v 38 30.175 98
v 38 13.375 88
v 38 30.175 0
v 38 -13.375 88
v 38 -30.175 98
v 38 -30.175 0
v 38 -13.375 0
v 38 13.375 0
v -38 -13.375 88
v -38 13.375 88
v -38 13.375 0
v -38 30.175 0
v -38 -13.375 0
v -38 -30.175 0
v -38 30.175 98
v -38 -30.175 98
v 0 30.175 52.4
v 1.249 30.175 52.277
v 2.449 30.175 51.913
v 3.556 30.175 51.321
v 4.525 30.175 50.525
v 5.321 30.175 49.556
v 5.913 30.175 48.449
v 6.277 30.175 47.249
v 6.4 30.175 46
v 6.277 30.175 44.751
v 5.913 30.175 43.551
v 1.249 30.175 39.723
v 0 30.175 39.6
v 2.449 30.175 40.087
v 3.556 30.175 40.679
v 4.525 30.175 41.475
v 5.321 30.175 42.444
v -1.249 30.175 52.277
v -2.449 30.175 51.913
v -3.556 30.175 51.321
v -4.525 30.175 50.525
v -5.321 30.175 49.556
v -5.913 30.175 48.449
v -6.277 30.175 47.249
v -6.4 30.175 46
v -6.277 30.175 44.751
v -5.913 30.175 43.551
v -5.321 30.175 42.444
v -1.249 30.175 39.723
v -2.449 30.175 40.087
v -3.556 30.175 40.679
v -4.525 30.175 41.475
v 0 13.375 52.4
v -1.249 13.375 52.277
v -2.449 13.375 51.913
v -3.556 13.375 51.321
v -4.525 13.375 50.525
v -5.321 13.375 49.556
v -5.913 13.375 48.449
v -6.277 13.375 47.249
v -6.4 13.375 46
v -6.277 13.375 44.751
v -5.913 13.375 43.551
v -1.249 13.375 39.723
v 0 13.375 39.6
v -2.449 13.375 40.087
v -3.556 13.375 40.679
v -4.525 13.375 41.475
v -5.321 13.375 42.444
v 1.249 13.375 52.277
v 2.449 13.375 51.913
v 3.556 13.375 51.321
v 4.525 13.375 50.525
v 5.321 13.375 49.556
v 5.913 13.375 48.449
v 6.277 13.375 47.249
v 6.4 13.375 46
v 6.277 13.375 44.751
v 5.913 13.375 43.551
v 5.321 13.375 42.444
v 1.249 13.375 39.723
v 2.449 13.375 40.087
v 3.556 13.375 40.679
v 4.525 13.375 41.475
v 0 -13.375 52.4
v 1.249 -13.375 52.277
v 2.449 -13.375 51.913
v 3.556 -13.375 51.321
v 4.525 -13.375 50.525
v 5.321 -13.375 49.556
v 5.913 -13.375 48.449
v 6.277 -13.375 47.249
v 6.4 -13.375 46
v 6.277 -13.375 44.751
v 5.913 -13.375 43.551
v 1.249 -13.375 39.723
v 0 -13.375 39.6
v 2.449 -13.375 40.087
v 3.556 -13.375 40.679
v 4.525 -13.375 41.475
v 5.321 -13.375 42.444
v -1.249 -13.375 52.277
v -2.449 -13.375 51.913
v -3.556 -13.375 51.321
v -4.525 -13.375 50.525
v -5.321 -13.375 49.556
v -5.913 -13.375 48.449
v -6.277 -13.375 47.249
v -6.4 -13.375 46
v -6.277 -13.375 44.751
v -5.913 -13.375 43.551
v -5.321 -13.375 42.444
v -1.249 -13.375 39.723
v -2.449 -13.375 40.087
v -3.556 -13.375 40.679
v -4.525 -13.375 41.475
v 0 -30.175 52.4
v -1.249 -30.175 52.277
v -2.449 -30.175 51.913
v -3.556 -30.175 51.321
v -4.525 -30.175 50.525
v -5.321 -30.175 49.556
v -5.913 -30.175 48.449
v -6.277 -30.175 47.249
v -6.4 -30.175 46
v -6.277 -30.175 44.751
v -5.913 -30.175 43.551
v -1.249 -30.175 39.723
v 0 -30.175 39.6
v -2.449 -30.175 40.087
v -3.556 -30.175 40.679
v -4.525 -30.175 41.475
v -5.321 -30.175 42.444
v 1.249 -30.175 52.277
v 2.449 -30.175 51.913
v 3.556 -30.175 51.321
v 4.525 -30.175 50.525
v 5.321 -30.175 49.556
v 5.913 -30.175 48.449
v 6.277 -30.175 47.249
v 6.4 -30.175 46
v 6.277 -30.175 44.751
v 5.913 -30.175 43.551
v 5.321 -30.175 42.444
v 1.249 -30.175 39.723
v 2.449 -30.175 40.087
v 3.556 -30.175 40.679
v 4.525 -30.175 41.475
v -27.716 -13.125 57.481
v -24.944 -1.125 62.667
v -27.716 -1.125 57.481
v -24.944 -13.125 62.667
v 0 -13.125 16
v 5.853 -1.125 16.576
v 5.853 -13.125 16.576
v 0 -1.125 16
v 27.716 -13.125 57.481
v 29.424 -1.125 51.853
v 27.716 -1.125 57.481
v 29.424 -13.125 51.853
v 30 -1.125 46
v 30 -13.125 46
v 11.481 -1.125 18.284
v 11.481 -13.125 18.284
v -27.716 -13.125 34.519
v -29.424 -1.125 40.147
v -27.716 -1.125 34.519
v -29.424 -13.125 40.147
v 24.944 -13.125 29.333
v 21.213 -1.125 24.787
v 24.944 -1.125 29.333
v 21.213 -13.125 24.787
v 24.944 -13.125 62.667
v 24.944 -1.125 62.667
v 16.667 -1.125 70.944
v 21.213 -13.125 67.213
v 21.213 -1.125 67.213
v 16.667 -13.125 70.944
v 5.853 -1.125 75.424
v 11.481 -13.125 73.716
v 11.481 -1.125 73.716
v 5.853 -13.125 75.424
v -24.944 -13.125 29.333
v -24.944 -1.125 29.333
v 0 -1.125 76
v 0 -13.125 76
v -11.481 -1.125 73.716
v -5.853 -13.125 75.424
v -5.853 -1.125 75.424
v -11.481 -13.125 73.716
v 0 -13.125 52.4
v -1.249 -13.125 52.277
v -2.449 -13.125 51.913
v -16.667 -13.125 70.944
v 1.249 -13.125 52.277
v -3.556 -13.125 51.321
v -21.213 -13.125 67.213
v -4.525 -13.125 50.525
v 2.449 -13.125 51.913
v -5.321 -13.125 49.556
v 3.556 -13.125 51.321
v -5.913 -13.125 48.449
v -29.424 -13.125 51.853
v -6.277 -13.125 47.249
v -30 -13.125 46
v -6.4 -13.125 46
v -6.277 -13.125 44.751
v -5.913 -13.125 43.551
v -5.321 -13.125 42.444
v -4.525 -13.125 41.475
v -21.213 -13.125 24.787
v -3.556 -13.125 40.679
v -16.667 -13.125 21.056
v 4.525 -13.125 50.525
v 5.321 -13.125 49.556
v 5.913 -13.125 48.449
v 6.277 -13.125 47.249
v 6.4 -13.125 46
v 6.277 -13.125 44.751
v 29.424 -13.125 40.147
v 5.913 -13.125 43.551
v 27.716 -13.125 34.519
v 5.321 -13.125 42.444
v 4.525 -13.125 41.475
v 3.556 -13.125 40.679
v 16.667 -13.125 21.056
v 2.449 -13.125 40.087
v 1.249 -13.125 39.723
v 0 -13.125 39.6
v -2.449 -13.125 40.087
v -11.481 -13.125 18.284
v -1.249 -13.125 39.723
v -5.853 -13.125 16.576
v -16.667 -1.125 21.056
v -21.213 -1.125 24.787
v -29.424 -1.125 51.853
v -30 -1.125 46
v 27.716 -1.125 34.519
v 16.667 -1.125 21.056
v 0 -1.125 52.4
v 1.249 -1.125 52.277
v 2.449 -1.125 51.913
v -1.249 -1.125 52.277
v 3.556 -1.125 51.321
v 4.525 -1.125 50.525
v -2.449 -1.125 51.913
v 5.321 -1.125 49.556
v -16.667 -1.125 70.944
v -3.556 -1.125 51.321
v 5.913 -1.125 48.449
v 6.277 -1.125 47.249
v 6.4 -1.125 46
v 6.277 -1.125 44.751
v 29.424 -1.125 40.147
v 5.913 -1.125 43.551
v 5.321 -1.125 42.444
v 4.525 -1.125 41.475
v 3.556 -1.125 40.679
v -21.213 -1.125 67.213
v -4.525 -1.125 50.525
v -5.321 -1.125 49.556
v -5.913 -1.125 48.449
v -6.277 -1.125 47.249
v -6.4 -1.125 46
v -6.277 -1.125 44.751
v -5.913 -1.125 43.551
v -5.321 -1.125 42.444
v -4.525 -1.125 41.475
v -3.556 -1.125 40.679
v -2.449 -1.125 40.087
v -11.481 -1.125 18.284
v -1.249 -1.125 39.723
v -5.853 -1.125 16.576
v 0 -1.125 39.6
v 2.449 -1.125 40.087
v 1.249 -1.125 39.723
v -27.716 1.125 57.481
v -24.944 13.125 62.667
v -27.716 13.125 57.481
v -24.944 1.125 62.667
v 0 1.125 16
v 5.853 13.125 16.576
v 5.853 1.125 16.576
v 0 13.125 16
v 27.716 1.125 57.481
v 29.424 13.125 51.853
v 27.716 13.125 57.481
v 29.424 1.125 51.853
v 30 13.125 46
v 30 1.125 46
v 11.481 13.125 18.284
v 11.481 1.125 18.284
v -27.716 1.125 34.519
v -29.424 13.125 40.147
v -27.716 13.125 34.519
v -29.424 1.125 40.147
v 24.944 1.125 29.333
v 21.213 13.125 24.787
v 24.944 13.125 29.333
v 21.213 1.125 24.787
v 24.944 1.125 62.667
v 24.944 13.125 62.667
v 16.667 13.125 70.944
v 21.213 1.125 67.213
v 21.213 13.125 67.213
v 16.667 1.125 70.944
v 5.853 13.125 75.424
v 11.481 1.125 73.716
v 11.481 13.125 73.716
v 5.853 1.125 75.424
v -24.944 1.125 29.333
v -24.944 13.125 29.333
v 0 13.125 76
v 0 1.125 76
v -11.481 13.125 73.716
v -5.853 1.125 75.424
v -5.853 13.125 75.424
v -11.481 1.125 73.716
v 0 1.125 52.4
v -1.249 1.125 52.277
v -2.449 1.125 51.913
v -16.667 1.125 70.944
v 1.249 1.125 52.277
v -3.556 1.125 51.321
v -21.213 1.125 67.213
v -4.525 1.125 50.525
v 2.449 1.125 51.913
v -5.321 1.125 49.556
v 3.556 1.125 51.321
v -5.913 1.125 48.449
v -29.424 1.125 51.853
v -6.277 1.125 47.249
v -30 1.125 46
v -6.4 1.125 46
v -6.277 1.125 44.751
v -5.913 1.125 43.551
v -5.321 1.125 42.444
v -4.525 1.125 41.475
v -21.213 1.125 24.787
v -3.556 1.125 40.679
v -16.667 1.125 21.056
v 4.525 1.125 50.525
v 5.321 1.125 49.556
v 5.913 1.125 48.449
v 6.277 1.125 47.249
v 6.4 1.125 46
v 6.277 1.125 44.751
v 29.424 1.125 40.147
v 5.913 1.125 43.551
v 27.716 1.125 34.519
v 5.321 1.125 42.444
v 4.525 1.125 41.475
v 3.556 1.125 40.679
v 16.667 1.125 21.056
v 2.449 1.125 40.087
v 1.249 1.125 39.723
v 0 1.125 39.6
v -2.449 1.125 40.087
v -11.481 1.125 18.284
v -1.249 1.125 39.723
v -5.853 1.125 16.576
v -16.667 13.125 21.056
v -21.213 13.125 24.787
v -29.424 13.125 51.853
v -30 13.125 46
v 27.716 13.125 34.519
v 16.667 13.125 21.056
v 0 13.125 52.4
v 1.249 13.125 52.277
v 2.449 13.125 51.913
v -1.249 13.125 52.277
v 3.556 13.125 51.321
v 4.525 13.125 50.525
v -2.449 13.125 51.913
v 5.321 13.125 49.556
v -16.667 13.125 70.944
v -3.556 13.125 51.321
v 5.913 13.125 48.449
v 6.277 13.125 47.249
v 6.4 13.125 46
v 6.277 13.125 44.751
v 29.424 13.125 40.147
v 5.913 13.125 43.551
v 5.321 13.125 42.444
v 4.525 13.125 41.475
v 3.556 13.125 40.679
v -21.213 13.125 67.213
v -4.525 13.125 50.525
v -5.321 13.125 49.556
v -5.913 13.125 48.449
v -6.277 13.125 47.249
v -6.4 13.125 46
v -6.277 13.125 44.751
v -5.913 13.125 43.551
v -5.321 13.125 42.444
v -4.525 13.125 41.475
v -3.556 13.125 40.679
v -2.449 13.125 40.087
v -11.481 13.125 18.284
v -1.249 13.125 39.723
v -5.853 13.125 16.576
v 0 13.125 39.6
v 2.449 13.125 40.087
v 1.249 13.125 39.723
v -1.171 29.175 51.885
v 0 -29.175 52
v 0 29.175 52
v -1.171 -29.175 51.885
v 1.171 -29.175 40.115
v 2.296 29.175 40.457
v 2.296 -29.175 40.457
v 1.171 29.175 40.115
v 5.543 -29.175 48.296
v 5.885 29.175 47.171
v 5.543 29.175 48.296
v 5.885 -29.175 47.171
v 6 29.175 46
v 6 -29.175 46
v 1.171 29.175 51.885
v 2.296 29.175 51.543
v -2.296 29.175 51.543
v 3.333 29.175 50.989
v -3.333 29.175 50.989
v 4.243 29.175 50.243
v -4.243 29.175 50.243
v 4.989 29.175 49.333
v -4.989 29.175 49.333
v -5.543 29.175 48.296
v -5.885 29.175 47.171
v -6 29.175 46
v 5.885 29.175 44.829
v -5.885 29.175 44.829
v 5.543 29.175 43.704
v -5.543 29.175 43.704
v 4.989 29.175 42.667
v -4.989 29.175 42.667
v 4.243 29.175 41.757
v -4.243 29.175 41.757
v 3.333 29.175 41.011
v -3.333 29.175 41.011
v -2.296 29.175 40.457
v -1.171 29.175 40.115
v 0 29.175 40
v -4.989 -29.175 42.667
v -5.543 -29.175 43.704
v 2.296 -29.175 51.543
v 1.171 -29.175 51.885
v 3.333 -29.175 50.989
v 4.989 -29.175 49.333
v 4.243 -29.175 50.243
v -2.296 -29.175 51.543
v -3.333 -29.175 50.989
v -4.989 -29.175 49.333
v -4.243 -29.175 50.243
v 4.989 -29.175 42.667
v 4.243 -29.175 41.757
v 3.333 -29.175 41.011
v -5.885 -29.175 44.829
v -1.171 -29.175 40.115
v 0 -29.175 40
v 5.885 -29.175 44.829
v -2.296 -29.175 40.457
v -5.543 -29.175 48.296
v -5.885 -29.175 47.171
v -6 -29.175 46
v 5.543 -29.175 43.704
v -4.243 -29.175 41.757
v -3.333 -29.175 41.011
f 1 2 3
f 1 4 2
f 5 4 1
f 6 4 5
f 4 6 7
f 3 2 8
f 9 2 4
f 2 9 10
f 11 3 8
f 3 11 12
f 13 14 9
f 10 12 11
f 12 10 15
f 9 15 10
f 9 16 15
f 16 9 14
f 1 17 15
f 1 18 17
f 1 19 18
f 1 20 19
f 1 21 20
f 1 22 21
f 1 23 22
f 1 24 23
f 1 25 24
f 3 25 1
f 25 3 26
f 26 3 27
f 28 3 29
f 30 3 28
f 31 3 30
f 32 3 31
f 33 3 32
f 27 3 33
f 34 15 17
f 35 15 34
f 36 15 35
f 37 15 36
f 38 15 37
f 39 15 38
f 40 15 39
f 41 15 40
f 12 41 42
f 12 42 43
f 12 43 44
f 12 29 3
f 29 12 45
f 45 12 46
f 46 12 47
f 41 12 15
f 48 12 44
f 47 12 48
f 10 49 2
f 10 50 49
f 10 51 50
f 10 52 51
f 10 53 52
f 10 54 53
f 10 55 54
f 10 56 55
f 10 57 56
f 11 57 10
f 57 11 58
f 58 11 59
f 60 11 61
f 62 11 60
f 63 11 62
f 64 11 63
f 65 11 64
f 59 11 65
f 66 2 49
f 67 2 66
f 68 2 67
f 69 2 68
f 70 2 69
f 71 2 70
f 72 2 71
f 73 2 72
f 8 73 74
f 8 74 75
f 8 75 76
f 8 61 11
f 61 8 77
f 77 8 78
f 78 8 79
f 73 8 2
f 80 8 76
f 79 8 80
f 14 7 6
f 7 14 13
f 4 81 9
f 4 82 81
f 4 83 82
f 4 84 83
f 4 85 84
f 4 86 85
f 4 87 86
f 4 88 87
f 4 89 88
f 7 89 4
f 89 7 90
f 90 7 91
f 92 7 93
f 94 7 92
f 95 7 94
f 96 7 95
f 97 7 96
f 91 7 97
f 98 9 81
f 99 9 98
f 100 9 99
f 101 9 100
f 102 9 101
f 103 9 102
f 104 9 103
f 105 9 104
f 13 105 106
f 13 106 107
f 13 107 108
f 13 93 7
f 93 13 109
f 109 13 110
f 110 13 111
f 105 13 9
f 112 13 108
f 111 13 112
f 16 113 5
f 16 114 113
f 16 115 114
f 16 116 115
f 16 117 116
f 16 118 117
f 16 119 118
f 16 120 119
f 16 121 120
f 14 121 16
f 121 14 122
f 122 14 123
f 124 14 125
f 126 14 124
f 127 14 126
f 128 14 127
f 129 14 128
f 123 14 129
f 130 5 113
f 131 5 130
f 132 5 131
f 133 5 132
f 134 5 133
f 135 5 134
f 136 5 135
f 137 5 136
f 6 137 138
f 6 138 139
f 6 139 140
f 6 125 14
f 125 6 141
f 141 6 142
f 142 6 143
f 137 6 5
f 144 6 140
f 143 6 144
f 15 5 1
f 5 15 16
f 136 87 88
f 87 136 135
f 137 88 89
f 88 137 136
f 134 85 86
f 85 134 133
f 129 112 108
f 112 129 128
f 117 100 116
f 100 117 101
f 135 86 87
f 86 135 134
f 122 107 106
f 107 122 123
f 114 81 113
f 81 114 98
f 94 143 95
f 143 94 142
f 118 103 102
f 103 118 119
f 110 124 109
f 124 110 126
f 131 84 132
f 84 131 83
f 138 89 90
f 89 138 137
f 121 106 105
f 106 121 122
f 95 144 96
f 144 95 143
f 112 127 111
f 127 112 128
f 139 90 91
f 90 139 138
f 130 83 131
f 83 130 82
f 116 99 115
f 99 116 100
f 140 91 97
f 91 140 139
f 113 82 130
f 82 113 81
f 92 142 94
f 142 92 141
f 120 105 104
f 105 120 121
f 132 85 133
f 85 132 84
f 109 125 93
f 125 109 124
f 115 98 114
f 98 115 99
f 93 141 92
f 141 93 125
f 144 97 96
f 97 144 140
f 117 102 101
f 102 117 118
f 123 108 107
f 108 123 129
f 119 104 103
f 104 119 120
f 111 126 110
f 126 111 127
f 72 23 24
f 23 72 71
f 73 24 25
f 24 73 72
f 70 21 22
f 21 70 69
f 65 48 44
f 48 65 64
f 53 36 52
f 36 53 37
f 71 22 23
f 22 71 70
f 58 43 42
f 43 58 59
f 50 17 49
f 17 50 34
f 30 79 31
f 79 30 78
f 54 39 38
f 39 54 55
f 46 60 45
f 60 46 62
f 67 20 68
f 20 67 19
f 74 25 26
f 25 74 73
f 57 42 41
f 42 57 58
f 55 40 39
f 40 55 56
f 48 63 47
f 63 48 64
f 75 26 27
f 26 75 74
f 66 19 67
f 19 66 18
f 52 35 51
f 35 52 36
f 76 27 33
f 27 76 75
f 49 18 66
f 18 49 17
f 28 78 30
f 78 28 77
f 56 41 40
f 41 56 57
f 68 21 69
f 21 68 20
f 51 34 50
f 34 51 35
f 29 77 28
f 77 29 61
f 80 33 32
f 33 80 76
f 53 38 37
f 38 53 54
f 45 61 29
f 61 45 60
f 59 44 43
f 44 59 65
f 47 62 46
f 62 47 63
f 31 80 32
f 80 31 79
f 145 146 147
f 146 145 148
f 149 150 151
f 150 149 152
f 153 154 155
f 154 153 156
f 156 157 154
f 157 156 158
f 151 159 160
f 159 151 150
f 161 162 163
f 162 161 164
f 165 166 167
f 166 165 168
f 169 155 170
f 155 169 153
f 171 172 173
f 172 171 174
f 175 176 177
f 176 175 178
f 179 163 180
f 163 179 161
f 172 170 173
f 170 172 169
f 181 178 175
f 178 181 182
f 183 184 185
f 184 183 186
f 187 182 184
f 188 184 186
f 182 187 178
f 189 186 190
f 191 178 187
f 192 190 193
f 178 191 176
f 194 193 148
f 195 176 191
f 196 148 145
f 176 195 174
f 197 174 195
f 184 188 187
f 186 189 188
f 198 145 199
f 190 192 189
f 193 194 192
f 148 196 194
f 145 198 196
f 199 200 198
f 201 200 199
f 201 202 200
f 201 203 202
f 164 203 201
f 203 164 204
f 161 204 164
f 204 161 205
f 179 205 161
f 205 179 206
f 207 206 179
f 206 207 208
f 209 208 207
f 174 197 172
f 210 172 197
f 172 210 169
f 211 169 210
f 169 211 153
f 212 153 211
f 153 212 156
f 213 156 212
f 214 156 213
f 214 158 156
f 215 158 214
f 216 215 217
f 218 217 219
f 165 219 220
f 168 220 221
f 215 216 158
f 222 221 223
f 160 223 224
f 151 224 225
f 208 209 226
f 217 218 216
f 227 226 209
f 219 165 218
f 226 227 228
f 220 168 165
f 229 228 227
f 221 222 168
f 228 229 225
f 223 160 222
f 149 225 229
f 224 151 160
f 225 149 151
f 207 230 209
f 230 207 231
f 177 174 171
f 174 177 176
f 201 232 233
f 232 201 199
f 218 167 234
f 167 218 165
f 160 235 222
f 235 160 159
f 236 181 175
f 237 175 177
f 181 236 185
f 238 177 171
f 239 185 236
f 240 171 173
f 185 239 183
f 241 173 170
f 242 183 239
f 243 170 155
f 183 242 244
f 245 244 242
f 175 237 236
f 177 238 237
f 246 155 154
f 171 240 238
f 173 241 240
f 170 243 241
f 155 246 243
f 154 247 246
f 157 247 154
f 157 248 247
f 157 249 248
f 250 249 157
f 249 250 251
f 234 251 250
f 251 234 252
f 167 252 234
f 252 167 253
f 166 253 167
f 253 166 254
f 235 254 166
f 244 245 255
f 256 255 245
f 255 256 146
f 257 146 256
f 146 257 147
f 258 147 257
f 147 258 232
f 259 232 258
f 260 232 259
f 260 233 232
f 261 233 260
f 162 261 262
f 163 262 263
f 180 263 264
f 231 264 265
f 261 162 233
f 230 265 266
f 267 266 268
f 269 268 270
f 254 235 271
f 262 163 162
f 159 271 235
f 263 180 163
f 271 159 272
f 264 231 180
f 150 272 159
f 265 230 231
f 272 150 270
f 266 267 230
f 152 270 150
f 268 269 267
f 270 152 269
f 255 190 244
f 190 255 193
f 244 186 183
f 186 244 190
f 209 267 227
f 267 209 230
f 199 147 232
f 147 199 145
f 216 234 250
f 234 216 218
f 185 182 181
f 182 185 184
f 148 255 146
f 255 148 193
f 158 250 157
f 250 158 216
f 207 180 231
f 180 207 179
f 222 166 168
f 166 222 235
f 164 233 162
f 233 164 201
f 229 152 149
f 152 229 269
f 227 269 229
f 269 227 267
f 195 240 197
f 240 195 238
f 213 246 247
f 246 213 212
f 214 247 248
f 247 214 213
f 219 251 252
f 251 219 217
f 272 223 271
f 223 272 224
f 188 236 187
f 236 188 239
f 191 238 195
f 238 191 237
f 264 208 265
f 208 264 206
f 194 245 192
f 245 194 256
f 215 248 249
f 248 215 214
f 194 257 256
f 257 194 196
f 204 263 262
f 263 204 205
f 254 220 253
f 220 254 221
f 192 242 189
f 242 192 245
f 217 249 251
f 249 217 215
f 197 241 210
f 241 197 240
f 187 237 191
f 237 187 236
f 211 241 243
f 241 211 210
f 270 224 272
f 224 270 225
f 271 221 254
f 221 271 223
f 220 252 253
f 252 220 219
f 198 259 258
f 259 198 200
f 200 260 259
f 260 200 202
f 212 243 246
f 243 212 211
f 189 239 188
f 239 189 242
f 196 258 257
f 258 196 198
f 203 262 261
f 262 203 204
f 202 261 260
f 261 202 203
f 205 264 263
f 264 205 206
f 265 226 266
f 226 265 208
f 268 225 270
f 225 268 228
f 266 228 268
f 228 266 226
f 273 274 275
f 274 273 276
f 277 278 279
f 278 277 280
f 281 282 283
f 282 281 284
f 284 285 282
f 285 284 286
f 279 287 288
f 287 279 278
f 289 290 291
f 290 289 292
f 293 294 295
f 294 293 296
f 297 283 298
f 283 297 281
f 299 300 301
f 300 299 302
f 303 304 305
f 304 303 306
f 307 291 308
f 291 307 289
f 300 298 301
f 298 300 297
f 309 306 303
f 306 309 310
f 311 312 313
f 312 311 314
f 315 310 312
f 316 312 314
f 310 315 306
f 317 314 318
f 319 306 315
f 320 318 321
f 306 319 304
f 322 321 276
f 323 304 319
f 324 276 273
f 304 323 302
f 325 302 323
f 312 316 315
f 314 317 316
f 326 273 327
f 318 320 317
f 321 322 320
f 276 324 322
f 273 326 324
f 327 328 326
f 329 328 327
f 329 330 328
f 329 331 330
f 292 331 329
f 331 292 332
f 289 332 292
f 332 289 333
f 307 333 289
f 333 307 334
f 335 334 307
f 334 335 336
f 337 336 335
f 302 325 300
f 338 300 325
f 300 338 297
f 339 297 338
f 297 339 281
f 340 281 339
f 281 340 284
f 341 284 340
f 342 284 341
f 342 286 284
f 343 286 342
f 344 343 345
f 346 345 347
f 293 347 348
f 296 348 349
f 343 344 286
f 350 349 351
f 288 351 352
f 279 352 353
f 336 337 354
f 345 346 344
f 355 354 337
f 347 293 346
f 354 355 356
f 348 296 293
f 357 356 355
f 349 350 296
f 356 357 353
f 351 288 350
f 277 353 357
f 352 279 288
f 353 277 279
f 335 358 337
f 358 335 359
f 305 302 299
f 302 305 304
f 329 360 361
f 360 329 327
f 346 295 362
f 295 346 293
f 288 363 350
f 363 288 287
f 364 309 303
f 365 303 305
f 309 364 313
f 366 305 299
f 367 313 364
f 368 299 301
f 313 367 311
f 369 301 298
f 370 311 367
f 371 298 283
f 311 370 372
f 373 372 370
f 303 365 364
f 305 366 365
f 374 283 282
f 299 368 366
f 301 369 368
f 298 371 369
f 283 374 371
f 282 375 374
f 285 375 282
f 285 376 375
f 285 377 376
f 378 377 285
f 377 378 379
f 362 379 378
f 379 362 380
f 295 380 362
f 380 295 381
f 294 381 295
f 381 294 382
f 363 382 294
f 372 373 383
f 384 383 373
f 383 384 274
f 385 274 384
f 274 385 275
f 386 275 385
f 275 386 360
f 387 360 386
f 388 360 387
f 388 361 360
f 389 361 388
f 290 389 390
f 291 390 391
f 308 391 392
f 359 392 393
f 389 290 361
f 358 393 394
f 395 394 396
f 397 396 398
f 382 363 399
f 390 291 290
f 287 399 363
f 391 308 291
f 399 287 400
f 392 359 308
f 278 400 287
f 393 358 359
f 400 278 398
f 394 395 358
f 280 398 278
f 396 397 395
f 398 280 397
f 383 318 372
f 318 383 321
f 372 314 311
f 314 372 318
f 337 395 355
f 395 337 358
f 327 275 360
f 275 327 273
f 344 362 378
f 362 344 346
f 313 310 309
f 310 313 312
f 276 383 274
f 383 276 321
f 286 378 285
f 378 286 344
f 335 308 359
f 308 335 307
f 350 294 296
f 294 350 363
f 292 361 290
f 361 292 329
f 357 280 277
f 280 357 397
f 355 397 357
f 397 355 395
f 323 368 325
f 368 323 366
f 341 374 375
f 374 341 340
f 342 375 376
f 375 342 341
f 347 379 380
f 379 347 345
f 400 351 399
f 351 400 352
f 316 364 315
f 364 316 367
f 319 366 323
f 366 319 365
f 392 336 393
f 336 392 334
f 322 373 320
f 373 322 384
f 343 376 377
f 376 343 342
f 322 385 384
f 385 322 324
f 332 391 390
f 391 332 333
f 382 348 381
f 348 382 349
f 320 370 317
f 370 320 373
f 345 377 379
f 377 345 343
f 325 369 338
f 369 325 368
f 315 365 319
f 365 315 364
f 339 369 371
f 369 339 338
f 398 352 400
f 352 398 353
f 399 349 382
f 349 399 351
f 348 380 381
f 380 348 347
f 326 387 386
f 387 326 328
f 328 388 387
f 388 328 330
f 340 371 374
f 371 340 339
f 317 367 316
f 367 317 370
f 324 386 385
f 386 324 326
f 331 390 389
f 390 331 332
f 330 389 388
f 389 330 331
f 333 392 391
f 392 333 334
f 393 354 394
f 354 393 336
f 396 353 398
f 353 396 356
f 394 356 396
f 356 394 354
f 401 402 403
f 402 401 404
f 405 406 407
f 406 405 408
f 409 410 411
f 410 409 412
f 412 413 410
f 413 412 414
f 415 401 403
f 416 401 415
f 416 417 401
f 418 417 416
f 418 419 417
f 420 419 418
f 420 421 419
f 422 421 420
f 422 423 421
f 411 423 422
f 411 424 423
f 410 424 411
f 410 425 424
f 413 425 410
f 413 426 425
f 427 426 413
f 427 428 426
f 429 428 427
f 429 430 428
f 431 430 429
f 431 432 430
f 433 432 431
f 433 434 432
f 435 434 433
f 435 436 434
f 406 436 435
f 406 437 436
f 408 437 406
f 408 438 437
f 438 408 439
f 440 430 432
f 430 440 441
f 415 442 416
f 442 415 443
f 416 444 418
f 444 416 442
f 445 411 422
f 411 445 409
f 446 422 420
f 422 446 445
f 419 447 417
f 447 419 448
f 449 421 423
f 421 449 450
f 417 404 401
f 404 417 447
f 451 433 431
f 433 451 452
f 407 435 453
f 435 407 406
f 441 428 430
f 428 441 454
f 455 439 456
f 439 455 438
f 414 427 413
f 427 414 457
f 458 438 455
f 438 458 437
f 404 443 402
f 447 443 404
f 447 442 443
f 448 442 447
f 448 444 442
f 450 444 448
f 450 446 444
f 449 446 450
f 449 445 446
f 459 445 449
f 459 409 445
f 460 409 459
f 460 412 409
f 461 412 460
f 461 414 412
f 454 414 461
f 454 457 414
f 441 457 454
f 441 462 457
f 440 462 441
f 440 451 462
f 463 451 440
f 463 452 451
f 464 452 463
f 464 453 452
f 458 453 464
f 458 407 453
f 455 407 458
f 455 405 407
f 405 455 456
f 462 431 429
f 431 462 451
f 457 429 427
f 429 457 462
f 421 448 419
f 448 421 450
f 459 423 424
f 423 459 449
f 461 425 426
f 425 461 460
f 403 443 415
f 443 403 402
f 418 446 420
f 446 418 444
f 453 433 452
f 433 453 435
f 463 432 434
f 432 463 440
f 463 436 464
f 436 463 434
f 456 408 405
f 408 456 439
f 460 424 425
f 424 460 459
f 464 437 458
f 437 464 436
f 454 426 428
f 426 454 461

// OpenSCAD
$fn = 32;

// ------------------------------------------------------------------------
// Trolley wheel set: wheels d60, fork 88 mm tall
// Every part is its own module, assembly() places every instance.
// ------------------------------------------------------------------------

// --- part 1 ---
module trolley_fork() {
  difference() {
    union() {
      translate([-38, 13.375, 0]) cube([76, 16.8, 88]);
      translate([-38, -30.175, 0]) cube([76, 16.8, 88]);
      translate([-38, -30.175, 88]) cube([76, 60.35, 10]);
    }
    translate([0, -21.775, 46]) rotate([90, 0, 0]) cylinder(h = 18.8, d = 12.8, center = true);
    translate([0, 21.775, 46]) rotate([90, 0, 0]) cylinder(h = 18.8, d = 12.8, center = true);
  }
}

// --- part 2 ---
module trolley_wheel() {
  difference() {
      translate([0, 0, 0]) cylinder(h = 12, d = 60);
      translate([0, 0, -1]) cylinder(h = 14, d = 12.8);
    }
}

// --- part 3 ---
module trolley_axle() {
  translate([0, 0, -29.175]) cylinder(h = 58.35, d = 12);
}

// --- assembly ---
module assembly() {
  color([0.80, 0.24, 0.20]) translate([0, 0, 0]) rotate([0, 0, 0]) trolley_fork();
  color([0.20, 0.45, 0.75]) translate([0, -1.125, 46]) rotate([90, 0, 0]) trolley_wheel();
  color([0.25, 0.62, 0.32]) translate([0, 13.125, 46]) rotate([90, 0, 0]) trolley_wheel();
  color([0.92, 0.70, 0.18]) translate([0, 0, 46]) rotate([90, 0, 0]) trolley_axle();
}

assembly();
